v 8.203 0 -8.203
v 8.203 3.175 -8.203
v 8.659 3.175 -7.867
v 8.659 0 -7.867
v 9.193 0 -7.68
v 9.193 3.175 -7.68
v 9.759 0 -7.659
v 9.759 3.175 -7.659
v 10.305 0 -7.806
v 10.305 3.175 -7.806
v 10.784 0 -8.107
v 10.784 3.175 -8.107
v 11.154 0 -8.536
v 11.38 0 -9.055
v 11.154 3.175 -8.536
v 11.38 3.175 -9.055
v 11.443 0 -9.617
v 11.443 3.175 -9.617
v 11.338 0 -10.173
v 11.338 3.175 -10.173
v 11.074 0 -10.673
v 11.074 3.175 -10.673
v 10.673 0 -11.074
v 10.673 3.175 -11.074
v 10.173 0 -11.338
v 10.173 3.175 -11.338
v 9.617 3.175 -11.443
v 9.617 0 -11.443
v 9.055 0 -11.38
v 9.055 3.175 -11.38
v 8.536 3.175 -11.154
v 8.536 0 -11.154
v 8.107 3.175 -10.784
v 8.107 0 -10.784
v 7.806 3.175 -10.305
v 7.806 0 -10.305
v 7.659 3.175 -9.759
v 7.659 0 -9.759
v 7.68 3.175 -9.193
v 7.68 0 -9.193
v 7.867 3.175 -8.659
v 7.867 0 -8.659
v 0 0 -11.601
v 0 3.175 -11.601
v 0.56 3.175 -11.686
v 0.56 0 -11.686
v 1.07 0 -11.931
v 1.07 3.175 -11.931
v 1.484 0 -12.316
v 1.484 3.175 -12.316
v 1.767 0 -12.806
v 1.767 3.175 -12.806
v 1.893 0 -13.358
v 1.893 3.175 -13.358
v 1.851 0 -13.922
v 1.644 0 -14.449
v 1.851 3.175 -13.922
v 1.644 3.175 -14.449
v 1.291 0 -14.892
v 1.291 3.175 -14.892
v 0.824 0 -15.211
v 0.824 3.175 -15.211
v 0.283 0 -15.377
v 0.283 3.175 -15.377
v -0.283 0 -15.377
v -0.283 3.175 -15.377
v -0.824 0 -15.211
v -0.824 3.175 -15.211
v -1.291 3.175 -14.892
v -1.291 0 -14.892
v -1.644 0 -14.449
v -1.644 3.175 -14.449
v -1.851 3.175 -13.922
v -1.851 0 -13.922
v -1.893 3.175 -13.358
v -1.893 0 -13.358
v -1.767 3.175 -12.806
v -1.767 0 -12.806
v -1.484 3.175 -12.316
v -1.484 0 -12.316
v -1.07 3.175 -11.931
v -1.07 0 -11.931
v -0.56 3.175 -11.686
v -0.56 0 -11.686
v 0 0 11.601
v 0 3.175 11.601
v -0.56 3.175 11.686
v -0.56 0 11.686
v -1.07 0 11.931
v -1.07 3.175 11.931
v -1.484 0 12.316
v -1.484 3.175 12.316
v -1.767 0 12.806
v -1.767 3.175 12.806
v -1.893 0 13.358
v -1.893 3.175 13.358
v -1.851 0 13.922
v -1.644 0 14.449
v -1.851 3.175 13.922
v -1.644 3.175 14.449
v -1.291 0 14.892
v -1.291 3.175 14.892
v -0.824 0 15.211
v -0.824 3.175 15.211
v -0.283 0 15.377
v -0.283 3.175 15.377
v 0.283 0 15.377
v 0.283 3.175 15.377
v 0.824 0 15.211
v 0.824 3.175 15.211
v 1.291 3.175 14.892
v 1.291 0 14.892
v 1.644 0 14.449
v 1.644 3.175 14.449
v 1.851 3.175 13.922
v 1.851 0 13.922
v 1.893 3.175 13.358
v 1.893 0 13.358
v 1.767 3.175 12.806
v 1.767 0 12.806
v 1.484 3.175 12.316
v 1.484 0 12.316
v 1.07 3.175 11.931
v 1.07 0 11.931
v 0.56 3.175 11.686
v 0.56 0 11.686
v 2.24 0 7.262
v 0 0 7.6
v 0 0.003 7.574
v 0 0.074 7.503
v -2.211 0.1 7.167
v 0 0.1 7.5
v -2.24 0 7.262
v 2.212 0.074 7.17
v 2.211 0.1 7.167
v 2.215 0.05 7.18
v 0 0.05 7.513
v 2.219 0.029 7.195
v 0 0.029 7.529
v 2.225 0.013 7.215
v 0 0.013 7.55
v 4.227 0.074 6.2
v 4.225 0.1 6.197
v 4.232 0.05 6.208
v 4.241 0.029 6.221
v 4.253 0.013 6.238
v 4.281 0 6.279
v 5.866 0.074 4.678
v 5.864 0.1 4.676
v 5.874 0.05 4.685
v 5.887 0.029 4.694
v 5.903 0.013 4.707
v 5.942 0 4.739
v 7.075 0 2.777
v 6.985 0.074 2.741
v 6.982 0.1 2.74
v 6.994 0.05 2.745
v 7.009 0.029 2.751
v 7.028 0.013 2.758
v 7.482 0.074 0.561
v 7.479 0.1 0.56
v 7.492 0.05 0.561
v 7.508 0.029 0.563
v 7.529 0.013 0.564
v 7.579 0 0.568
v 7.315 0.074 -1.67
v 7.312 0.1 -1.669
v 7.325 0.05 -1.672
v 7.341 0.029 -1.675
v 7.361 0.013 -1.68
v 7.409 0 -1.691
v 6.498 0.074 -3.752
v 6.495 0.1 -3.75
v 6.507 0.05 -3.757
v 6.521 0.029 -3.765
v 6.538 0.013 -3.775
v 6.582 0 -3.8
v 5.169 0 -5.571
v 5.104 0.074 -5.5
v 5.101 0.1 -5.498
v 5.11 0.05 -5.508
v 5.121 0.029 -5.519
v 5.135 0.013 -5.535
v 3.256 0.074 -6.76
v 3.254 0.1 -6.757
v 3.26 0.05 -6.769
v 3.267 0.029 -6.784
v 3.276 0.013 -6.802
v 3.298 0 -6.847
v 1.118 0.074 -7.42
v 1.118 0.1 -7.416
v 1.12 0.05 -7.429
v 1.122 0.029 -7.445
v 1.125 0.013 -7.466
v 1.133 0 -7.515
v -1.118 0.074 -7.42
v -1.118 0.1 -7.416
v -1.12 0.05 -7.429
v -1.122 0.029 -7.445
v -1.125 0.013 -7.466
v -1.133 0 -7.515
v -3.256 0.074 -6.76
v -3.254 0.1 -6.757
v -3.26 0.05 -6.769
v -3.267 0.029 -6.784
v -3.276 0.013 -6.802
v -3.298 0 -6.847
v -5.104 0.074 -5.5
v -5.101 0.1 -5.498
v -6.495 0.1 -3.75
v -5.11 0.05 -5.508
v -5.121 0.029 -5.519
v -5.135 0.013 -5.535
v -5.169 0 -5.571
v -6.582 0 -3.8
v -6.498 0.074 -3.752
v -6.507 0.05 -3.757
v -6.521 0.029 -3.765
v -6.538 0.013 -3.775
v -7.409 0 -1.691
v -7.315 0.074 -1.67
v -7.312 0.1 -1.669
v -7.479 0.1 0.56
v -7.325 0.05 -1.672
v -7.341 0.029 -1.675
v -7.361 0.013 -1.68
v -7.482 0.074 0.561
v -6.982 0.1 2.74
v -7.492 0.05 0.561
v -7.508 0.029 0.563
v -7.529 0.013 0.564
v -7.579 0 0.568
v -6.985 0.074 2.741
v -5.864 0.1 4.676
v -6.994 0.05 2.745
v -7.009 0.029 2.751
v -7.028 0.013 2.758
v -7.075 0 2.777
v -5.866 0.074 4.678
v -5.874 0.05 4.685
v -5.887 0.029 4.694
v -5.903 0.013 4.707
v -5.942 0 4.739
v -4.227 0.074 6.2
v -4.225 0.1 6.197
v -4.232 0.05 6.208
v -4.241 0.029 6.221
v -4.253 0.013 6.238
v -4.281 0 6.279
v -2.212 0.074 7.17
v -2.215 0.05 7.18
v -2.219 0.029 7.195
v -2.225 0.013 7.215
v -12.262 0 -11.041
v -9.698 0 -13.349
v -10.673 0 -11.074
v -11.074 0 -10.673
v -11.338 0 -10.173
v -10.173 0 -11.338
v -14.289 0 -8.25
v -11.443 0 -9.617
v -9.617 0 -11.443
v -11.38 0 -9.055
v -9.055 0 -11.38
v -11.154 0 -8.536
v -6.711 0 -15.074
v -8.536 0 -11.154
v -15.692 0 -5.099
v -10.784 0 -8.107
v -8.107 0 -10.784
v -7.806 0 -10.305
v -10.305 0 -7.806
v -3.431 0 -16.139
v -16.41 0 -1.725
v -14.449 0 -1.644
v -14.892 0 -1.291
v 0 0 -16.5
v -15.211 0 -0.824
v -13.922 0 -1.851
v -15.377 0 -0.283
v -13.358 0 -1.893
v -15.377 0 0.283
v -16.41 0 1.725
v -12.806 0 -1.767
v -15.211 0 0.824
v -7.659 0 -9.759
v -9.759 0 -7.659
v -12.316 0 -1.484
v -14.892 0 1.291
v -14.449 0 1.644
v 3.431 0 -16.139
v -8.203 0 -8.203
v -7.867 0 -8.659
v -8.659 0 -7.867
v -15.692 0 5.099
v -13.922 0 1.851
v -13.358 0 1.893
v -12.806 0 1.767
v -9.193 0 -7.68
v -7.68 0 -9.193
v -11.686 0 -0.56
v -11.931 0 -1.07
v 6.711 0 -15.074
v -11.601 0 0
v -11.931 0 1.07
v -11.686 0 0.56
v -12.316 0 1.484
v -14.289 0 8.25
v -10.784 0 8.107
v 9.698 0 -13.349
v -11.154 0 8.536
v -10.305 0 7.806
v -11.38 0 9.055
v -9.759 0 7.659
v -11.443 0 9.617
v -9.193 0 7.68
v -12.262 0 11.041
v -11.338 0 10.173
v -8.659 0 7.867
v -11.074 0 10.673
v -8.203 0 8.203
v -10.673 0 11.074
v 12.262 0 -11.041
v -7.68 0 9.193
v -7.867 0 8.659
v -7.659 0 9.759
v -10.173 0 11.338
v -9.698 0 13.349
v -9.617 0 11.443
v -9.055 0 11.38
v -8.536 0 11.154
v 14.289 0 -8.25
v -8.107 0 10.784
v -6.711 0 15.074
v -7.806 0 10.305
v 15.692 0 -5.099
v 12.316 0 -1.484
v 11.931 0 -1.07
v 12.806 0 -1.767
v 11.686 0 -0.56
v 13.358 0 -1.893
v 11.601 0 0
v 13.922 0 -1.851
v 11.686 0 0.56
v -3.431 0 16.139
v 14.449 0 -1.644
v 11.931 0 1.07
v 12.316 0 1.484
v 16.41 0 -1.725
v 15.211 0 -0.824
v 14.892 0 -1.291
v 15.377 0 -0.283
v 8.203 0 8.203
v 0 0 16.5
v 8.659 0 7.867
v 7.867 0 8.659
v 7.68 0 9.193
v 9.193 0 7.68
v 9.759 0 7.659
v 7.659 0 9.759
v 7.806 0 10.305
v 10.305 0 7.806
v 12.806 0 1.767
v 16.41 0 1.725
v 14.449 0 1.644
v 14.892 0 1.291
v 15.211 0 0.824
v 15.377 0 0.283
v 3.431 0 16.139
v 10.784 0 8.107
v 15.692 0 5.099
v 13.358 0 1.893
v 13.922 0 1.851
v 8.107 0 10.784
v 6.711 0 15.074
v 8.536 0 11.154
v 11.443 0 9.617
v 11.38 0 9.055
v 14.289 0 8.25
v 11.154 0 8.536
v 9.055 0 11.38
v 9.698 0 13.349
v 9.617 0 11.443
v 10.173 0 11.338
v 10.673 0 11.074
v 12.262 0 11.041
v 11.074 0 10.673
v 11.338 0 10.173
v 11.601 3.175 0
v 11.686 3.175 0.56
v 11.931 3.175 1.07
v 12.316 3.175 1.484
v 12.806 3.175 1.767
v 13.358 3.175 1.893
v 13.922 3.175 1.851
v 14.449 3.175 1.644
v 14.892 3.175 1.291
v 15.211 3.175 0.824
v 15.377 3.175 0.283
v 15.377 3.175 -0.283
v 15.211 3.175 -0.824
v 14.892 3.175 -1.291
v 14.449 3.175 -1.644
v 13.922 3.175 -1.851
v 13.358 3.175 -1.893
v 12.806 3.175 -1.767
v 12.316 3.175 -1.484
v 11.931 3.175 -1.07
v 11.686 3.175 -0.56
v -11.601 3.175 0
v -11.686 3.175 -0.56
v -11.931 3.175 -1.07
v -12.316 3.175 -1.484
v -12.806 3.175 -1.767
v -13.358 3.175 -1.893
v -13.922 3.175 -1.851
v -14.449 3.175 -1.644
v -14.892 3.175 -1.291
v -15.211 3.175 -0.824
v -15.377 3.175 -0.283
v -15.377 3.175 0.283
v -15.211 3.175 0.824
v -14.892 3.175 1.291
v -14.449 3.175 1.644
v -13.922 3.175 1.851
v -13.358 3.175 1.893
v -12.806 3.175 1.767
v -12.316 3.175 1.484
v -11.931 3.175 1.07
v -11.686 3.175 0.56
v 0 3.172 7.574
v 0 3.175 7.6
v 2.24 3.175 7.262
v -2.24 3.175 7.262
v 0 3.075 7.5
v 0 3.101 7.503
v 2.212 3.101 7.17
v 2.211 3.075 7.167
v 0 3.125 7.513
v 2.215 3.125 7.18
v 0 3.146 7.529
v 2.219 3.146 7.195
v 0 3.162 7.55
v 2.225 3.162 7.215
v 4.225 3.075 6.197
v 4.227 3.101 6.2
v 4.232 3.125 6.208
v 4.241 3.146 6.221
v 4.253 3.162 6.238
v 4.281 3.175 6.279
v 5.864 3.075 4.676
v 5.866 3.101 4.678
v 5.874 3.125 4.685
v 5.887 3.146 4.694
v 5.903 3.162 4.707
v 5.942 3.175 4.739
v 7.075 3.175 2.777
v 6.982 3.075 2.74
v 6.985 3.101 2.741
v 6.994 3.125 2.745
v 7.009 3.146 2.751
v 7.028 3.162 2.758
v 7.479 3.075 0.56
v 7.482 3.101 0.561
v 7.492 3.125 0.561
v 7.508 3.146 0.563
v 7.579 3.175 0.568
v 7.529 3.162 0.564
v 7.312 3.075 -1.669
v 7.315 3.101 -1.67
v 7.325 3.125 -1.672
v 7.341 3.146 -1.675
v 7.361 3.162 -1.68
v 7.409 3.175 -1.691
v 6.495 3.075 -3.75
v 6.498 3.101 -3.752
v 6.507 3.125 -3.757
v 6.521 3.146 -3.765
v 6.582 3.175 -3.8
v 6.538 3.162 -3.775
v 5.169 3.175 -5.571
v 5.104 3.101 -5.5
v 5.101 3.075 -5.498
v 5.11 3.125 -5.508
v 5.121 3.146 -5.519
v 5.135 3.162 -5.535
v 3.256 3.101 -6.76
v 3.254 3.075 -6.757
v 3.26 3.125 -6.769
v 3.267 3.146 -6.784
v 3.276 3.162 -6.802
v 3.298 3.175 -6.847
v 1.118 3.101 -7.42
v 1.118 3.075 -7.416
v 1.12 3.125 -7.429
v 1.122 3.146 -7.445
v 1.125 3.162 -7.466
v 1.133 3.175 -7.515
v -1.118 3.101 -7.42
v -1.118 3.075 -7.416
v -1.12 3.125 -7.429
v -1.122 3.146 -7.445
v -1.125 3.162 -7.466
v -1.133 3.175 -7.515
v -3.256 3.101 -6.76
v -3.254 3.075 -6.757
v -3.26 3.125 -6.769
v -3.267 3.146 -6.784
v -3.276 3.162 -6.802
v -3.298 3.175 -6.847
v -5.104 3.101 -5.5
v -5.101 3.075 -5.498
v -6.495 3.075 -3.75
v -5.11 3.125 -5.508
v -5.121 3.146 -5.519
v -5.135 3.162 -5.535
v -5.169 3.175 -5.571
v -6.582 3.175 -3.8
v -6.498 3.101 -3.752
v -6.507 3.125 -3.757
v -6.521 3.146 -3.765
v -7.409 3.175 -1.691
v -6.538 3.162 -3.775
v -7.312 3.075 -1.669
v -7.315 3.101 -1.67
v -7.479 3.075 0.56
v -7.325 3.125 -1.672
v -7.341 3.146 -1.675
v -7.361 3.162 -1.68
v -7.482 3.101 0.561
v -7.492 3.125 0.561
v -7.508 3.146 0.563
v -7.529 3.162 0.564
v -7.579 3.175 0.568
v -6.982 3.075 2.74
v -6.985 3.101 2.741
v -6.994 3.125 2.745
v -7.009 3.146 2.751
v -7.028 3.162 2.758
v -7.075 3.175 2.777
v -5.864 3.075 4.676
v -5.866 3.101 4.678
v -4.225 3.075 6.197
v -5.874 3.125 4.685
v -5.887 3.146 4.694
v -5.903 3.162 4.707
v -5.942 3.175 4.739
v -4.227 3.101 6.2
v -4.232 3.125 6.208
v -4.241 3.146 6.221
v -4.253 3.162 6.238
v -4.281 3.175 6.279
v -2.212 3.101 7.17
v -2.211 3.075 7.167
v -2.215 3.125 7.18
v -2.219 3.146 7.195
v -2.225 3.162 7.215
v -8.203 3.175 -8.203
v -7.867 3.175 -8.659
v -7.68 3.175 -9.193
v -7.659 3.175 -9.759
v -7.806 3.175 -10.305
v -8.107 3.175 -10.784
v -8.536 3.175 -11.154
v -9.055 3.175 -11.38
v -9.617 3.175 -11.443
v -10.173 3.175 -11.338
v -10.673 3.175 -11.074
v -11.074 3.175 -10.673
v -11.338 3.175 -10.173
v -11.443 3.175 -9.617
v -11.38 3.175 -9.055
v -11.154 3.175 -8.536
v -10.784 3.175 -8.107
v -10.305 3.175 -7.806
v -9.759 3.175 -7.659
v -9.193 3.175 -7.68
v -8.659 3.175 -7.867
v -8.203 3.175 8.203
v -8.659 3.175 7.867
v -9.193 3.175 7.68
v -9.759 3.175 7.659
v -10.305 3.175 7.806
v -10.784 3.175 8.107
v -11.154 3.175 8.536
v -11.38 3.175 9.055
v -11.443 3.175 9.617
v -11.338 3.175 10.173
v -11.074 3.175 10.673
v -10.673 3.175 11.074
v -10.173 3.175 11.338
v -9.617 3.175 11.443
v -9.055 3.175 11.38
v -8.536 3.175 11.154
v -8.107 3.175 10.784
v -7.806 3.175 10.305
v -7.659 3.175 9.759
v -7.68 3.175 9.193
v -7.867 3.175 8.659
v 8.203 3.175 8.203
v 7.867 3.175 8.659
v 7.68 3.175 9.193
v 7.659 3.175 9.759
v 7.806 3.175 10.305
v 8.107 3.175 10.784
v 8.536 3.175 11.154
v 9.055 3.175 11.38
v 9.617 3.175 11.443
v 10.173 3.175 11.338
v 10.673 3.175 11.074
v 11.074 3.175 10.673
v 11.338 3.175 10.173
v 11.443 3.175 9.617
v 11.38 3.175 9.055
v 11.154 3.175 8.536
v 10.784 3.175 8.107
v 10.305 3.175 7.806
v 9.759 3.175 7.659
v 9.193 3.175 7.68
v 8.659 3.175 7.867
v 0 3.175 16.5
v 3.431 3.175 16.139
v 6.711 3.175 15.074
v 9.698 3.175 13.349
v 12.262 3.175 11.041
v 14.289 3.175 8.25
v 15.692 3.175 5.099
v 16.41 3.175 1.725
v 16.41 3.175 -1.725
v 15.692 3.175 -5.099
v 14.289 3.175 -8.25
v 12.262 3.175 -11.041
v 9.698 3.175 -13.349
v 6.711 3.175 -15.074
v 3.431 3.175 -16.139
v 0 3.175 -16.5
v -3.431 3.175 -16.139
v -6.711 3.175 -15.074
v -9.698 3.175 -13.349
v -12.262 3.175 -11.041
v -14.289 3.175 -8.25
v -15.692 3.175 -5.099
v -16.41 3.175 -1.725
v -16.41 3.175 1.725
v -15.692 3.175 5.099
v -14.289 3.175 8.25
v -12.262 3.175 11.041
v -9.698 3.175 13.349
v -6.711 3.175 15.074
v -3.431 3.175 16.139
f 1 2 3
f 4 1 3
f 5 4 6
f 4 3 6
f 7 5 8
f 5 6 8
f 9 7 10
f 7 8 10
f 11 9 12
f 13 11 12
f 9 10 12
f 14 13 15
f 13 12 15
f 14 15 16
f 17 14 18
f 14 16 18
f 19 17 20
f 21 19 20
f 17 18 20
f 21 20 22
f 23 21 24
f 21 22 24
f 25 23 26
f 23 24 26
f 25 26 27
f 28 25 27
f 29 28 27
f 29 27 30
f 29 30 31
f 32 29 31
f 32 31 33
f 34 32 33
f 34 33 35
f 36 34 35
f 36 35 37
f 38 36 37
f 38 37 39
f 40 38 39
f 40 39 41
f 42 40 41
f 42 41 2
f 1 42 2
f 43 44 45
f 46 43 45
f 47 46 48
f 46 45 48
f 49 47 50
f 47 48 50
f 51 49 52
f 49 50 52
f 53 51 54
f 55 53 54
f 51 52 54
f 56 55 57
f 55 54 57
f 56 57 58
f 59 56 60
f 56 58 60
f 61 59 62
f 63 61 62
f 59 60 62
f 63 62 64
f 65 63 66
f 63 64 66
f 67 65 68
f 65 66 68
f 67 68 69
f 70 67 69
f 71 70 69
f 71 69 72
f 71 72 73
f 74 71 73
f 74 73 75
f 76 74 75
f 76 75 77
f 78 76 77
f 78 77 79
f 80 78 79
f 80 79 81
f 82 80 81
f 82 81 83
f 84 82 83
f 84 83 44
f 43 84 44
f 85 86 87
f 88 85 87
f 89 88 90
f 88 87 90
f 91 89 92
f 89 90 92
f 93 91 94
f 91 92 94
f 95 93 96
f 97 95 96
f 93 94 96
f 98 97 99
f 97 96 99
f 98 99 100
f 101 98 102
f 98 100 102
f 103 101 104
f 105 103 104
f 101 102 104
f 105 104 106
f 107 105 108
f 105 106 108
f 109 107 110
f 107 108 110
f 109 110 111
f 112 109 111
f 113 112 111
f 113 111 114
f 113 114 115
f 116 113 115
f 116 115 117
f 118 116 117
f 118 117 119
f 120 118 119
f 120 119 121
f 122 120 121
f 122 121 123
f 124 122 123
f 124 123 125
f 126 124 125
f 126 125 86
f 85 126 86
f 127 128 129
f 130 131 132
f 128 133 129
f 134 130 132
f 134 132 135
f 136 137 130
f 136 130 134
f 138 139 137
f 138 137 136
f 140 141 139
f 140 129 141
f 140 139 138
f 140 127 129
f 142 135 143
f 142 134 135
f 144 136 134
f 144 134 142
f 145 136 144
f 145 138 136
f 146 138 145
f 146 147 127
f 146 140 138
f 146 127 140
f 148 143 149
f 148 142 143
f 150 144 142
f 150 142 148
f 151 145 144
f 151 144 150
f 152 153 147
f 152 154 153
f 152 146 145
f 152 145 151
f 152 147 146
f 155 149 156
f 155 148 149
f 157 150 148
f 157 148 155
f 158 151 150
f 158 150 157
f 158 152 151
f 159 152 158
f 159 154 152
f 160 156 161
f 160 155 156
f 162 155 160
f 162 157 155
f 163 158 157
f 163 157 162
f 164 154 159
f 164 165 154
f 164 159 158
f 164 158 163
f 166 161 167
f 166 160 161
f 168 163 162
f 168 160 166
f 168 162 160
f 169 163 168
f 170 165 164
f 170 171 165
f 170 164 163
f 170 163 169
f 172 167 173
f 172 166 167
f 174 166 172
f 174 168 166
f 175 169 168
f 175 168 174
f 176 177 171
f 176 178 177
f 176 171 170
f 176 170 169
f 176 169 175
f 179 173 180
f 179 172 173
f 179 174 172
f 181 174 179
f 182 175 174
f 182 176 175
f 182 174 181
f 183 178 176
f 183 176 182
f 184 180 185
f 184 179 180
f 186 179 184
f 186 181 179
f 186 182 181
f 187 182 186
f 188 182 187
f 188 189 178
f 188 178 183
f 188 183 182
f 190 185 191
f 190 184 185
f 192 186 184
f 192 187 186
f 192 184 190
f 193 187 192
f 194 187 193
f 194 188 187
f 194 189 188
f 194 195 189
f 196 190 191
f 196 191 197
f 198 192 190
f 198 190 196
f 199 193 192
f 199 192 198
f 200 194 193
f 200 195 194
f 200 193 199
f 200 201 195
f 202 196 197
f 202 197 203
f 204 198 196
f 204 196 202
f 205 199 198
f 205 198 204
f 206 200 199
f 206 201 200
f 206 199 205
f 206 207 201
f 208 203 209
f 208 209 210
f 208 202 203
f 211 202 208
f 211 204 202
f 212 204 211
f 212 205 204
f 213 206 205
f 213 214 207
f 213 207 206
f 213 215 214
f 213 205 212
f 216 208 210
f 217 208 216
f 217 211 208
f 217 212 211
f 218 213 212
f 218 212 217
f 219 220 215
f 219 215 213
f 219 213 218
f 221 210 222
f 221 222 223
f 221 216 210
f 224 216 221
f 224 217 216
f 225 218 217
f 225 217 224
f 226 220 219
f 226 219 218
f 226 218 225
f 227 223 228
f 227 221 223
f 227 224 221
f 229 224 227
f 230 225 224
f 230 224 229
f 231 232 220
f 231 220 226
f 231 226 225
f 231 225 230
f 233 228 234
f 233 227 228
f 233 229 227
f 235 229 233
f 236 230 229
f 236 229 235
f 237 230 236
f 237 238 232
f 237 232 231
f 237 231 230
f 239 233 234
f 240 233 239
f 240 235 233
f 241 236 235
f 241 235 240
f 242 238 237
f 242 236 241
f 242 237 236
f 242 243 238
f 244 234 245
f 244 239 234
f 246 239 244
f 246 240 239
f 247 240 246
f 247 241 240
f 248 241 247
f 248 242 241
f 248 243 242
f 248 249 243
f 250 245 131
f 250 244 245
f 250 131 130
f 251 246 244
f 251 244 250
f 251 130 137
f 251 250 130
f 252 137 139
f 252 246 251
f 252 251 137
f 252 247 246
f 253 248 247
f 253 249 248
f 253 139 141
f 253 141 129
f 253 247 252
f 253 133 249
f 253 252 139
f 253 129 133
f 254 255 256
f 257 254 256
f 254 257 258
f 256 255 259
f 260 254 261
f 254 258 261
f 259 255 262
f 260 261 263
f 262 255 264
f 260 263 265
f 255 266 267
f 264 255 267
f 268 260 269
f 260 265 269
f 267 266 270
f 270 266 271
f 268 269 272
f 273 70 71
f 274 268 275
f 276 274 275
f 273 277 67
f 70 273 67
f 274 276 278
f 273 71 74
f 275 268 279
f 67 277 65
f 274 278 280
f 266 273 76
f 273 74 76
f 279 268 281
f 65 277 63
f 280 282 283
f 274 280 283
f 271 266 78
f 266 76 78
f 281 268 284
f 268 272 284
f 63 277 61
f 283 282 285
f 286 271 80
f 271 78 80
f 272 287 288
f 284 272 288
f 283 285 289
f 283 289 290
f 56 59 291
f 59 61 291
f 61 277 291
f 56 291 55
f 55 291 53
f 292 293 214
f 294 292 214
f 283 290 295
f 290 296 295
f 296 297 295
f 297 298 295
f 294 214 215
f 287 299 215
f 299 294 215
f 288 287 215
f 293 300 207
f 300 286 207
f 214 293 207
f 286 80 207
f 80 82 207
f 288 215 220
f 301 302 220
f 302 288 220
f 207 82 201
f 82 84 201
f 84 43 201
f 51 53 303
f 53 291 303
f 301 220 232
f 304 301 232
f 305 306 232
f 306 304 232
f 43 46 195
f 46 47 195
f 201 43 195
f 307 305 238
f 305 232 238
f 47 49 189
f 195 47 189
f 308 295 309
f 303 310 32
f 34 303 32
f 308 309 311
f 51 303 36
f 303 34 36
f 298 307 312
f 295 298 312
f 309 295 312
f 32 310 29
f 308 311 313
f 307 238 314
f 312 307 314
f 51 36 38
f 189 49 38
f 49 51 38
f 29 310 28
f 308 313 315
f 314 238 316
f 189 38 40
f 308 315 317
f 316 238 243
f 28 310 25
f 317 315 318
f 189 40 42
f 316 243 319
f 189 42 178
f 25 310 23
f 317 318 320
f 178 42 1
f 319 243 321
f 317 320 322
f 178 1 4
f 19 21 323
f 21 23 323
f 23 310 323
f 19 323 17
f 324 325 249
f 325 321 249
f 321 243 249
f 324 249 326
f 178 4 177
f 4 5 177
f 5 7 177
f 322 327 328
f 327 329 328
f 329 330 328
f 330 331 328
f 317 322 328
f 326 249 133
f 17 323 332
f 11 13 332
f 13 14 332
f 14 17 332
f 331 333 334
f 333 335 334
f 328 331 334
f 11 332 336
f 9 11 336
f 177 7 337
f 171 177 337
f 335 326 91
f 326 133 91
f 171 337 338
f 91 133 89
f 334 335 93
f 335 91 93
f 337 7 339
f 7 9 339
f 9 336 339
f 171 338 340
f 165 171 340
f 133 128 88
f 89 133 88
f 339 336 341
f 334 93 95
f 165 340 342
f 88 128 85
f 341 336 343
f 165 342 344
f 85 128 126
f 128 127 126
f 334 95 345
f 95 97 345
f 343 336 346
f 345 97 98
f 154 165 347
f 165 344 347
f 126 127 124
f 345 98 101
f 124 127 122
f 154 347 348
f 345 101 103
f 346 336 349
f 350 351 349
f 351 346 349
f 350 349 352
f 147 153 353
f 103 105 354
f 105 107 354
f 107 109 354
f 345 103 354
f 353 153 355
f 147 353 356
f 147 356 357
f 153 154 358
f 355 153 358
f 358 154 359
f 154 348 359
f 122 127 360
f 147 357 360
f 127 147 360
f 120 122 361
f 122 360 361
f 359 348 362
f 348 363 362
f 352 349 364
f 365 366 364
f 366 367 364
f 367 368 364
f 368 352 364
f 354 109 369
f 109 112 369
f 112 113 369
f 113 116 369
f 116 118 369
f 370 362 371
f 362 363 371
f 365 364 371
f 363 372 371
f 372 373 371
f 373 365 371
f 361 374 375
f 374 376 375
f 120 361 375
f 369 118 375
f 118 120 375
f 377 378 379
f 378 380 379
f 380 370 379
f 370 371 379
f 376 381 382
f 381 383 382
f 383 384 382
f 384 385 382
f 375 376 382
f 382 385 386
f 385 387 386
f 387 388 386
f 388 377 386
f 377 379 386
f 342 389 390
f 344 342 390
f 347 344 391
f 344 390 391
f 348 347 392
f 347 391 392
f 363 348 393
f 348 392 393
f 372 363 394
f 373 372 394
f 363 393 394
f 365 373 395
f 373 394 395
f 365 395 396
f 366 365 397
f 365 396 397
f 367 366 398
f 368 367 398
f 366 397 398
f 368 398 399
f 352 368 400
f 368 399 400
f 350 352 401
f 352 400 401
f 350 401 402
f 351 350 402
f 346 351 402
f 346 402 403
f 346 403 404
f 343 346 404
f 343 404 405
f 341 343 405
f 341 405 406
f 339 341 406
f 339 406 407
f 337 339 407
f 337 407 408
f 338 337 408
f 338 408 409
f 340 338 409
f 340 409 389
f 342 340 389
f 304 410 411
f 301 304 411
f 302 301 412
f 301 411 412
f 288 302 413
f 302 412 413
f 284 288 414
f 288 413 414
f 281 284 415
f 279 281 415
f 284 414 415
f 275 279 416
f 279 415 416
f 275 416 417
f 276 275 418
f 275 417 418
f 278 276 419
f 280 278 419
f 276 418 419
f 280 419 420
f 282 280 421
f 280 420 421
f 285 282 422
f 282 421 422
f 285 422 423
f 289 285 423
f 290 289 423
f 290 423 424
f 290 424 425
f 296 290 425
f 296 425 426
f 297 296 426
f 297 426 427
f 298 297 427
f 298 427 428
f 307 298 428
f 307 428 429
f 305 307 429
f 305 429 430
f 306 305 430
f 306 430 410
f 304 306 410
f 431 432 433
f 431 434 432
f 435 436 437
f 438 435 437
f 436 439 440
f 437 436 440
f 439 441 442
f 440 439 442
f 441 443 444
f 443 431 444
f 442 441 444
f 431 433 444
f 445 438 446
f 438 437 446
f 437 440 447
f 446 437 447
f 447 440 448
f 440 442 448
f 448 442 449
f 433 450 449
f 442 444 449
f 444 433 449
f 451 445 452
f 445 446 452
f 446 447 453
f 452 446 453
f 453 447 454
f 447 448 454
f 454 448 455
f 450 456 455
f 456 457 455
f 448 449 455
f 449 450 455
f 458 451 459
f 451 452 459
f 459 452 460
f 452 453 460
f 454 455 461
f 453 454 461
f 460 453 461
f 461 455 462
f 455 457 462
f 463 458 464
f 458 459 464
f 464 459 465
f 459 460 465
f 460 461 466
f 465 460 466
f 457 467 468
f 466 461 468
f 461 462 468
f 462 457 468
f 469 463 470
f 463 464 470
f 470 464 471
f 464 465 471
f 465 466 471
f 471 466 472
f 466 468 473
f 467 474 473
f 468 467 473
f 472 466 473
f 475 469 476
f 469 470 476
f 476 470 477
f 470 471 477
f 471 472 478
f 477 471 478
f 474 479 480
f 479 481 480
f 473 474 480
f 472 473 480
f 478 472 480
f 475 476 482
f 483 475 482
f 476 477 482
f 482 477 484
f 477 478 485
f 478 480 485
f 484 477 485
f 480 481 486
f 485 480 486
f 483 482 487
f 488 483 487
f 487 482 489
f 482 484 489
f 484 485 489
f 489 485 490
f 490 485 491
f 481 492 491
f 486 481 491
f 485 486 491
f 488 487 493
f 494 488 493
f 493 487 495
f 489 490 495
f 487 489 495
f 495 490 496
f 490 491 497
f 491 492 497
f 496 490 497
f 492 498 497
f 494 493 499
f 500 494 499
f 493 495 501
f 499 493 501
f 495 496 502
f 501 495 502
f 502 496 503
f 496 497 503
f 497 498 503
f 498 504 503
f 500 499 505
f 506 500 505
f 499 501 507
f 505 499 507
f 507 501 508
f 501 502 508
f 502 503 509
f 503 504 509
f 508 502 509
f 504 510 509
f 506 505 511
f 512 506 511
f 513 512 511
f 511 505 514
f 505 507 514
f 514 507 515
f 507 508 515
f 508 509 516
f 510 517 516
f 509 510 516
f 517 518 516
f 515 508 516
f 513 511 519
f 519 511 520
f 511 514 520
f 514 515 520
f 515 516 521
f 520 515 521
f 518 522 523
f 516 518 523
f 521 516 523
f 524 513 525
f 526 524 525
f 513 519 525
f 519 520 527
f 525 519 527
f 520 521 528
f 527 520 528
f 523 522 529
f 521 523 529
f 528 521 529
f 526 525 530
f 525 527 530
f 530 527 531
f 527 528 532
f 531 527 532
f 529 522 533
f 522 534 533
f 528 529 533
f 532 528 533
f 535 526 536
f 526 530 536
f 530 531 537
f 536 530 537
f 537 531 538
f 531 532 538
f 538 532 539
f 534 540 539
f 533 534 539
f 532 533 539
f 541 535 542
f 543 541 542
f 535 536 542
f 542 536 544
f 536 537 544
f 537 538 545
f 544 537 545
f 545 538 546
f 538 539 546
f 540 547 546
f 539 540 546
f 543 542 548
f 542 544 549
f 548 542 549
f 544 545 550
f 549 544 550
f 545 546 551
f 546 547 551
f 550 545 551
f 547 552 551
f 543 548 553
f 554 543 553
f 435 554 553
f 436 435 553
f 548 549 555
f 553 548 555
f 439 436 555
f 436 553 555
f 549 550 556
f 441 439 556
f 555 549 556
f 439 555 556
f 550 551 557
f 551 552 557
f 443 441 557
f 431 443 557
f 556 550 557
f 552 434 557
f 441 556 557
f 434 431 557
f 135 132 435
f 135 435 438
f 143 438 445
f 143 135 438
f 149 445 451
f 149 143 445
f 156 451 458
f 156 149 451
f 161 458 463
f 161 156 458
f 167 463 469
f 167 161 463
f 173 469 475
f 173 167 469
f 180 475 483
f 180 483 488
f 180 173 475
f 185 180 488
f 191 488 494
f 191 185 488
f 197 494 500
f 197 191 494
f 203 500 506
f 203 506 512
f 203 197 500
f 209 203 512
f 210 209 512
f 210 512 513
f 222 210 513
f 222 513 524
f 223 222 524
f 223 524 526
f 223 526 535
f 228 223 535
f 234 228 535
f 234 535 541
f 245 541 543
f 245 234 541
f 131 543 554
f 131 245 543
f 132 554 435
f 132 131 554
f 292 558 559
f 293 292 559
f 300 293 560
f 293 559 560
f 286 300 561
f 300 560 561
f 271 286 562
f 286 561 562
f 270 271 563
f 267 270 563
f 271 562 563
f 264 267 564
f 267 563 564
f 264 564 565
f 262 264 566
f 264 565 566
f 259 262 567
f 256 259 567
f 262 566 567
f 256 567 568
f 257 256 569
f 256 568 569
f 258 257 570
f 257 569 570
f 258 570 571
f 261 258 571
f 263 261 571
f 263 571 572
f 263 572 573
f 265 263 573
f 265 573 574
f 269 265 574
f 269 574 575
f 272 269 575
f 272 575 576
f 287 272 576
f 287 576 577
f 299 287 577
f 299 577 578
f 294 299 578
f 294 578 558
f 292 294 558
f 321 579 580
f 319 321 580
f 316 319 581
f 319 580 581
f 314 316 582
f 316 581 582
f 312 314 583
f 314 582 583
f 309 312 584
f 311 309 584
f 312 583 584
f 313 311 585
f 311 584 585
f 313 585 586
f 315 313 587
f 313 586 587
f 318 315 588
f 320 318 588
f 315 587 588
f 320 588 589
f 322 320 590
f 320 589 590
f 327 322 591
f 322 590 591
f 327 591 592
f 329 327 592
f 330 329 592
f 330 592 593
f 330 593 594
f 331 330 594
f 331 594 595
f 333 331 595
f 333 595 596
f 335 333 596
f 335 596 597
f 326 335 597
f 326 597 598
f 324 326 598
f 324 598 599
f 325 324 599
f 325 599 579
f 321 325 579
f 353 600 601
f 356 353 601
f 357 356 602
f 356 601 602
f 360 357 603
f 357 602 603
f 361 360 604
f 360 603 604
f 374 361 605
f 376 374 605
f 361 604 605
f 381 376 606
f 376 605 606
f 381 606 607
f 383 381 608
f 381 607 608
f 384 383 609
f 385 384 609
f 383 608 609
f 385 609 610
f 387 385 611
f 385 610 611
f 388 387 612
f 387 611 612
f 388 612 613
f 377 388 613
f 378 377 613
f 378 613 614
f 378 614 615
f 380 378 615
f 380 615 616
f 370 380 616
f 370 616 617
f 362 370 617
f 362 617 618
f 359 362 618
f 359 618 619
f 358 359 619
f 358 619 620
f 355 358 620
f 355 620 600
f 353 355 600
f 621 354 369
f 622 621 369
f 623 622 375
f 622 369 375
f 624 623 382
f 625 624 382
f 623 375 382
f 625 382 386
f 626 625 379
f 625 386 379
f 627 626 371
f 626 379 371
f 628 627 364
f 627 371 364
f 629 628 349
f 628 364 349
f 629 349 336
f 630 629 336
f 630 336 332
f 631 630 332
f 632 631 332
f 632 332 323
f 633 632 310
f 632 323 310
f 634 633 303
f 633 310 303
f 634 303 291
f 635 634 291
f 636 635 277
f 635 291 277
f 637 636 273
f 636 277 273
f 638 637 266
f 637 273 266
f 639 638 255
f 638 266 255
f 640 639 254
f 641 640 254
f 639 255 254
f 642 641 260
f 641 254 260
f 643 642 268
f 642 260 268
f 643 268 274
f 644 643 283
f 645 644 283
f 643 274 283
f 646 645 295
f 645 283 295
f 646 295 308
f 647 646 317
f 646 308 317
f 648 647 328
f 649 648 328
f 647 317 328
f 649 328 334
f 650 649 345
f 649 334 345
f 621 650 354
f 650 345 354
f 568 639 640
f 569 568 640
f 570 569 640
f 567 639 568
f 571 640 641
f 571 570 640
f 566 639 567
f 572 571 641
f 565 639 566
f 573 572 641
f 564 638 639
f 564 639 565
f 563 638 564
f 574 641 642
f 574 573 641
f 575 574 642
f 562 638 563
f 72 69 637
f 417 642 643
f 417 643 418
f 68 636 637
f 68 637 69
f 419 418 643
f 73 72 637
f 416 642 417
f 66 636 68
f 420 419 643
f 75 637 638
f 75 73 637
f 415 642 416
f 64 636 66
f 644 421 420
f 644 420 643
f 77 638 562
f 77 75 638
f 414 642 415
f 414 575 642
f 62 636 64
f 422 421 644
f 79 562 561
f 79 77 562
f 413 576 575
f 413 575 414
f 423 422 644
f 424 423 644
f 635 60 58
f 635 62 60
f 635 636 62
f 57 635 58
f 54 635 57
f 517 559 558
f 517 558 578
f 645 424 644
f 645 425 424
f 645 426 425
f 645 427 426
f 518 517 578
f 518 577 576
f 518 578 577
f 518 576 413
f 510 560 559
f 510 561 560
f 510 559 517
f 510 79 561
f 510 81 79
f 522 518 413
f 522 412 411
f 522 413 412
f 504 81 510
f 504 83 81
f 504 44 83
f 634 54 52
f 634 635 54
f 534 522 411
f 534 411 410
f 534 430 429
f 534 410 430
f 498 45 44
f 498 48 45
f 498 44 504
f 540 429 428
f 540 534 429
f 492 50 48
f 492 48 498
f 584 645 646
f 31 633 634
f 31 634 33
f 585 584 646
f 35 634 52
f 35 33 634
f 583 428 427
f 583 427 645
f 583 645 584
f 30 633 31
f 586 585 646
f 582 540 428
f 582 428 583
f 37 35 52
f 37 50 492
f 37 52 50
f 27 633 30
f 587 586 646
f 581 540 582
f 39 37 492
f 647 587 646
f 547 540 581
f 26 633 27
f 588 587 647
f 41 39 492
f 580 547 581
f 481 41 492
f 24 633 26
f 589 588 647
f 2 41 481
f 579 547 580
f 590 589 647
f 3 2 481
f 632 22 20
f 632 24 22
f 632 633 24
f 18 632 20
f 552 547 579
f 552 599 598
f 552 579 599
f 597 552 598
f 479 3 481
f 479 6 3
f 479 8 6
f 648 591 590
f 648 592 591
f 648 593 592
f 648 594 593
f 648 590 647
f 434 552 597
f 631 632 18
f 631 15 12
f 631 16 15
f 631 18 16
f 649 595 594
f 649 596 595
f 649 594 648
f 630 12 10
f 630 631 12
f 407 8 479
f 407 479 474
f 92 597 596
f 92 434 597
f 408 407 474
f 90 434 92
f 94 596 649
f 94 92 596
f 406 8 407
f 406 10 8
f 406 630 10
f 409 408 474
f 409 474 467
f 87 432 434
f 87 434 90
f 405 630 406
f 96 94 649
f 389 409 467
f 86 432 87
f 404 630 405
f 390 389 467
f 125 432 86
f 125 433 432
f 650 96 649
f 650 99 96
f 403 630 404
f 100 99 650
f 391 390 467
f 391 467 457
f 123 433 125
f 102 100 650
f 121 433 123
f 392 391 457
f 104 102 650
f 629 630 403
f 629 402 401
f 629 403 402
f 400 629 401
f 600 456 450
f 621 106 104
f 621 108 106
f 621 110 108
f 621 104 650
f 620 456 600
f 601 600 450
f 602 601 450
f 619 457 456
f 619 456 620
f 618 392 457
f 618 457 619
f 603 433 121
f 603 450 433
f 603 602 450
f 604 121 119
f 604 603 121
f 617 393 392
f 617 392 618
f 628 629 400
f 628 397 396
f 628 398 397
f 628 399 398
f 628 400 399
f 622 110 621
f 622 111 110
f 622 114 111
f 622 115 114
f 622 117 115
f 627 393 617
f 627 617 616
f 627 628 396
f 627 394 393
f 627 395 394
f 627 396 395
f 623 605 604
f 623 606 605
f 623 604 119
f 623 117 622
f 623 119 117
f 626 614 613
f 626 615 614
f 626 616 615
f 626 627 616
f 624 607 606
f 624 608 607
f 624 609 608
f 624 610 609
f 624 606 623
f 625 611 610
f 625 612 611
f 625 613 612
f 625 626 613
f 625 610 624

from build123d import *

# Parameters (mm, degrees)
SKETCH1_R           = 16.5
SKETCH1_R_2         = 7.5
BOSS_EXTRUDE1_DEPTH = 3.175
FILLET1_R           = 0.1
SKETCH2_R           = 1.89865
CUT_EXTRUDE1_DEPTH  = 24.549535558
CIRPATTERN1_COUNT   = 8


with BuildPart() as part:
    # Sketch1 → Boss-Extrude1 (new body)
    with BuildSketch(Plane(origin=(0, 0, 0), x_dir=(1, 0, 0), z_dir=(0, 1, 0))):
        with Locations(Location((0, 0, 0), (0, 0, 270))):
            Circle(SKETCH1_R)
        with Locations(Location((0, 0, 0), (0, 0, 270))):
            Circle(SKETCH1_R_2, mode=Mode.SUBTRACT)
    extrude(amount=BOSS_EXTRUDE1_DEPTH)

    # Fillet1
    fillet1_edges = [part.edges().sort_by_distance(p)[0] for p in [
        (0, 0, -7.5),
        (0, 3.175, -7.5),
    ]]
    fillet(fillet1_edges, radius=FILLET1_R)

    # Sketch2 → Cut-Extrude1 (cut, through all)
    with BuildSketch(Plane(origin=(0, 3.175, 0), x_dir=(-1, 0, 0), z_dir=(0, 1, 0))):
        with Locations(Location((0, -13.5, 0), (0, 0, 90))):
            Circle(SKETCH2_R)
    cut_extrude1 = extrude(amount=-CUT_EXTRUDE1_DEPTH, mode=Mode.SUBTRACT)

    # CirPattern1: Cut-Extrude1 ×8 about axis
    cirpattern1_axis = Axis((0, 0, 0), (0, 1, 0))
    for i in range(1, CIRPATTERN1_COUNT):
        add(cut_extrude1.rotate(cirpattern1_axis, i * 360 / CIRPATTERN1_COUNT), mode=Mode.SUBTRACT)


solid = part.part
